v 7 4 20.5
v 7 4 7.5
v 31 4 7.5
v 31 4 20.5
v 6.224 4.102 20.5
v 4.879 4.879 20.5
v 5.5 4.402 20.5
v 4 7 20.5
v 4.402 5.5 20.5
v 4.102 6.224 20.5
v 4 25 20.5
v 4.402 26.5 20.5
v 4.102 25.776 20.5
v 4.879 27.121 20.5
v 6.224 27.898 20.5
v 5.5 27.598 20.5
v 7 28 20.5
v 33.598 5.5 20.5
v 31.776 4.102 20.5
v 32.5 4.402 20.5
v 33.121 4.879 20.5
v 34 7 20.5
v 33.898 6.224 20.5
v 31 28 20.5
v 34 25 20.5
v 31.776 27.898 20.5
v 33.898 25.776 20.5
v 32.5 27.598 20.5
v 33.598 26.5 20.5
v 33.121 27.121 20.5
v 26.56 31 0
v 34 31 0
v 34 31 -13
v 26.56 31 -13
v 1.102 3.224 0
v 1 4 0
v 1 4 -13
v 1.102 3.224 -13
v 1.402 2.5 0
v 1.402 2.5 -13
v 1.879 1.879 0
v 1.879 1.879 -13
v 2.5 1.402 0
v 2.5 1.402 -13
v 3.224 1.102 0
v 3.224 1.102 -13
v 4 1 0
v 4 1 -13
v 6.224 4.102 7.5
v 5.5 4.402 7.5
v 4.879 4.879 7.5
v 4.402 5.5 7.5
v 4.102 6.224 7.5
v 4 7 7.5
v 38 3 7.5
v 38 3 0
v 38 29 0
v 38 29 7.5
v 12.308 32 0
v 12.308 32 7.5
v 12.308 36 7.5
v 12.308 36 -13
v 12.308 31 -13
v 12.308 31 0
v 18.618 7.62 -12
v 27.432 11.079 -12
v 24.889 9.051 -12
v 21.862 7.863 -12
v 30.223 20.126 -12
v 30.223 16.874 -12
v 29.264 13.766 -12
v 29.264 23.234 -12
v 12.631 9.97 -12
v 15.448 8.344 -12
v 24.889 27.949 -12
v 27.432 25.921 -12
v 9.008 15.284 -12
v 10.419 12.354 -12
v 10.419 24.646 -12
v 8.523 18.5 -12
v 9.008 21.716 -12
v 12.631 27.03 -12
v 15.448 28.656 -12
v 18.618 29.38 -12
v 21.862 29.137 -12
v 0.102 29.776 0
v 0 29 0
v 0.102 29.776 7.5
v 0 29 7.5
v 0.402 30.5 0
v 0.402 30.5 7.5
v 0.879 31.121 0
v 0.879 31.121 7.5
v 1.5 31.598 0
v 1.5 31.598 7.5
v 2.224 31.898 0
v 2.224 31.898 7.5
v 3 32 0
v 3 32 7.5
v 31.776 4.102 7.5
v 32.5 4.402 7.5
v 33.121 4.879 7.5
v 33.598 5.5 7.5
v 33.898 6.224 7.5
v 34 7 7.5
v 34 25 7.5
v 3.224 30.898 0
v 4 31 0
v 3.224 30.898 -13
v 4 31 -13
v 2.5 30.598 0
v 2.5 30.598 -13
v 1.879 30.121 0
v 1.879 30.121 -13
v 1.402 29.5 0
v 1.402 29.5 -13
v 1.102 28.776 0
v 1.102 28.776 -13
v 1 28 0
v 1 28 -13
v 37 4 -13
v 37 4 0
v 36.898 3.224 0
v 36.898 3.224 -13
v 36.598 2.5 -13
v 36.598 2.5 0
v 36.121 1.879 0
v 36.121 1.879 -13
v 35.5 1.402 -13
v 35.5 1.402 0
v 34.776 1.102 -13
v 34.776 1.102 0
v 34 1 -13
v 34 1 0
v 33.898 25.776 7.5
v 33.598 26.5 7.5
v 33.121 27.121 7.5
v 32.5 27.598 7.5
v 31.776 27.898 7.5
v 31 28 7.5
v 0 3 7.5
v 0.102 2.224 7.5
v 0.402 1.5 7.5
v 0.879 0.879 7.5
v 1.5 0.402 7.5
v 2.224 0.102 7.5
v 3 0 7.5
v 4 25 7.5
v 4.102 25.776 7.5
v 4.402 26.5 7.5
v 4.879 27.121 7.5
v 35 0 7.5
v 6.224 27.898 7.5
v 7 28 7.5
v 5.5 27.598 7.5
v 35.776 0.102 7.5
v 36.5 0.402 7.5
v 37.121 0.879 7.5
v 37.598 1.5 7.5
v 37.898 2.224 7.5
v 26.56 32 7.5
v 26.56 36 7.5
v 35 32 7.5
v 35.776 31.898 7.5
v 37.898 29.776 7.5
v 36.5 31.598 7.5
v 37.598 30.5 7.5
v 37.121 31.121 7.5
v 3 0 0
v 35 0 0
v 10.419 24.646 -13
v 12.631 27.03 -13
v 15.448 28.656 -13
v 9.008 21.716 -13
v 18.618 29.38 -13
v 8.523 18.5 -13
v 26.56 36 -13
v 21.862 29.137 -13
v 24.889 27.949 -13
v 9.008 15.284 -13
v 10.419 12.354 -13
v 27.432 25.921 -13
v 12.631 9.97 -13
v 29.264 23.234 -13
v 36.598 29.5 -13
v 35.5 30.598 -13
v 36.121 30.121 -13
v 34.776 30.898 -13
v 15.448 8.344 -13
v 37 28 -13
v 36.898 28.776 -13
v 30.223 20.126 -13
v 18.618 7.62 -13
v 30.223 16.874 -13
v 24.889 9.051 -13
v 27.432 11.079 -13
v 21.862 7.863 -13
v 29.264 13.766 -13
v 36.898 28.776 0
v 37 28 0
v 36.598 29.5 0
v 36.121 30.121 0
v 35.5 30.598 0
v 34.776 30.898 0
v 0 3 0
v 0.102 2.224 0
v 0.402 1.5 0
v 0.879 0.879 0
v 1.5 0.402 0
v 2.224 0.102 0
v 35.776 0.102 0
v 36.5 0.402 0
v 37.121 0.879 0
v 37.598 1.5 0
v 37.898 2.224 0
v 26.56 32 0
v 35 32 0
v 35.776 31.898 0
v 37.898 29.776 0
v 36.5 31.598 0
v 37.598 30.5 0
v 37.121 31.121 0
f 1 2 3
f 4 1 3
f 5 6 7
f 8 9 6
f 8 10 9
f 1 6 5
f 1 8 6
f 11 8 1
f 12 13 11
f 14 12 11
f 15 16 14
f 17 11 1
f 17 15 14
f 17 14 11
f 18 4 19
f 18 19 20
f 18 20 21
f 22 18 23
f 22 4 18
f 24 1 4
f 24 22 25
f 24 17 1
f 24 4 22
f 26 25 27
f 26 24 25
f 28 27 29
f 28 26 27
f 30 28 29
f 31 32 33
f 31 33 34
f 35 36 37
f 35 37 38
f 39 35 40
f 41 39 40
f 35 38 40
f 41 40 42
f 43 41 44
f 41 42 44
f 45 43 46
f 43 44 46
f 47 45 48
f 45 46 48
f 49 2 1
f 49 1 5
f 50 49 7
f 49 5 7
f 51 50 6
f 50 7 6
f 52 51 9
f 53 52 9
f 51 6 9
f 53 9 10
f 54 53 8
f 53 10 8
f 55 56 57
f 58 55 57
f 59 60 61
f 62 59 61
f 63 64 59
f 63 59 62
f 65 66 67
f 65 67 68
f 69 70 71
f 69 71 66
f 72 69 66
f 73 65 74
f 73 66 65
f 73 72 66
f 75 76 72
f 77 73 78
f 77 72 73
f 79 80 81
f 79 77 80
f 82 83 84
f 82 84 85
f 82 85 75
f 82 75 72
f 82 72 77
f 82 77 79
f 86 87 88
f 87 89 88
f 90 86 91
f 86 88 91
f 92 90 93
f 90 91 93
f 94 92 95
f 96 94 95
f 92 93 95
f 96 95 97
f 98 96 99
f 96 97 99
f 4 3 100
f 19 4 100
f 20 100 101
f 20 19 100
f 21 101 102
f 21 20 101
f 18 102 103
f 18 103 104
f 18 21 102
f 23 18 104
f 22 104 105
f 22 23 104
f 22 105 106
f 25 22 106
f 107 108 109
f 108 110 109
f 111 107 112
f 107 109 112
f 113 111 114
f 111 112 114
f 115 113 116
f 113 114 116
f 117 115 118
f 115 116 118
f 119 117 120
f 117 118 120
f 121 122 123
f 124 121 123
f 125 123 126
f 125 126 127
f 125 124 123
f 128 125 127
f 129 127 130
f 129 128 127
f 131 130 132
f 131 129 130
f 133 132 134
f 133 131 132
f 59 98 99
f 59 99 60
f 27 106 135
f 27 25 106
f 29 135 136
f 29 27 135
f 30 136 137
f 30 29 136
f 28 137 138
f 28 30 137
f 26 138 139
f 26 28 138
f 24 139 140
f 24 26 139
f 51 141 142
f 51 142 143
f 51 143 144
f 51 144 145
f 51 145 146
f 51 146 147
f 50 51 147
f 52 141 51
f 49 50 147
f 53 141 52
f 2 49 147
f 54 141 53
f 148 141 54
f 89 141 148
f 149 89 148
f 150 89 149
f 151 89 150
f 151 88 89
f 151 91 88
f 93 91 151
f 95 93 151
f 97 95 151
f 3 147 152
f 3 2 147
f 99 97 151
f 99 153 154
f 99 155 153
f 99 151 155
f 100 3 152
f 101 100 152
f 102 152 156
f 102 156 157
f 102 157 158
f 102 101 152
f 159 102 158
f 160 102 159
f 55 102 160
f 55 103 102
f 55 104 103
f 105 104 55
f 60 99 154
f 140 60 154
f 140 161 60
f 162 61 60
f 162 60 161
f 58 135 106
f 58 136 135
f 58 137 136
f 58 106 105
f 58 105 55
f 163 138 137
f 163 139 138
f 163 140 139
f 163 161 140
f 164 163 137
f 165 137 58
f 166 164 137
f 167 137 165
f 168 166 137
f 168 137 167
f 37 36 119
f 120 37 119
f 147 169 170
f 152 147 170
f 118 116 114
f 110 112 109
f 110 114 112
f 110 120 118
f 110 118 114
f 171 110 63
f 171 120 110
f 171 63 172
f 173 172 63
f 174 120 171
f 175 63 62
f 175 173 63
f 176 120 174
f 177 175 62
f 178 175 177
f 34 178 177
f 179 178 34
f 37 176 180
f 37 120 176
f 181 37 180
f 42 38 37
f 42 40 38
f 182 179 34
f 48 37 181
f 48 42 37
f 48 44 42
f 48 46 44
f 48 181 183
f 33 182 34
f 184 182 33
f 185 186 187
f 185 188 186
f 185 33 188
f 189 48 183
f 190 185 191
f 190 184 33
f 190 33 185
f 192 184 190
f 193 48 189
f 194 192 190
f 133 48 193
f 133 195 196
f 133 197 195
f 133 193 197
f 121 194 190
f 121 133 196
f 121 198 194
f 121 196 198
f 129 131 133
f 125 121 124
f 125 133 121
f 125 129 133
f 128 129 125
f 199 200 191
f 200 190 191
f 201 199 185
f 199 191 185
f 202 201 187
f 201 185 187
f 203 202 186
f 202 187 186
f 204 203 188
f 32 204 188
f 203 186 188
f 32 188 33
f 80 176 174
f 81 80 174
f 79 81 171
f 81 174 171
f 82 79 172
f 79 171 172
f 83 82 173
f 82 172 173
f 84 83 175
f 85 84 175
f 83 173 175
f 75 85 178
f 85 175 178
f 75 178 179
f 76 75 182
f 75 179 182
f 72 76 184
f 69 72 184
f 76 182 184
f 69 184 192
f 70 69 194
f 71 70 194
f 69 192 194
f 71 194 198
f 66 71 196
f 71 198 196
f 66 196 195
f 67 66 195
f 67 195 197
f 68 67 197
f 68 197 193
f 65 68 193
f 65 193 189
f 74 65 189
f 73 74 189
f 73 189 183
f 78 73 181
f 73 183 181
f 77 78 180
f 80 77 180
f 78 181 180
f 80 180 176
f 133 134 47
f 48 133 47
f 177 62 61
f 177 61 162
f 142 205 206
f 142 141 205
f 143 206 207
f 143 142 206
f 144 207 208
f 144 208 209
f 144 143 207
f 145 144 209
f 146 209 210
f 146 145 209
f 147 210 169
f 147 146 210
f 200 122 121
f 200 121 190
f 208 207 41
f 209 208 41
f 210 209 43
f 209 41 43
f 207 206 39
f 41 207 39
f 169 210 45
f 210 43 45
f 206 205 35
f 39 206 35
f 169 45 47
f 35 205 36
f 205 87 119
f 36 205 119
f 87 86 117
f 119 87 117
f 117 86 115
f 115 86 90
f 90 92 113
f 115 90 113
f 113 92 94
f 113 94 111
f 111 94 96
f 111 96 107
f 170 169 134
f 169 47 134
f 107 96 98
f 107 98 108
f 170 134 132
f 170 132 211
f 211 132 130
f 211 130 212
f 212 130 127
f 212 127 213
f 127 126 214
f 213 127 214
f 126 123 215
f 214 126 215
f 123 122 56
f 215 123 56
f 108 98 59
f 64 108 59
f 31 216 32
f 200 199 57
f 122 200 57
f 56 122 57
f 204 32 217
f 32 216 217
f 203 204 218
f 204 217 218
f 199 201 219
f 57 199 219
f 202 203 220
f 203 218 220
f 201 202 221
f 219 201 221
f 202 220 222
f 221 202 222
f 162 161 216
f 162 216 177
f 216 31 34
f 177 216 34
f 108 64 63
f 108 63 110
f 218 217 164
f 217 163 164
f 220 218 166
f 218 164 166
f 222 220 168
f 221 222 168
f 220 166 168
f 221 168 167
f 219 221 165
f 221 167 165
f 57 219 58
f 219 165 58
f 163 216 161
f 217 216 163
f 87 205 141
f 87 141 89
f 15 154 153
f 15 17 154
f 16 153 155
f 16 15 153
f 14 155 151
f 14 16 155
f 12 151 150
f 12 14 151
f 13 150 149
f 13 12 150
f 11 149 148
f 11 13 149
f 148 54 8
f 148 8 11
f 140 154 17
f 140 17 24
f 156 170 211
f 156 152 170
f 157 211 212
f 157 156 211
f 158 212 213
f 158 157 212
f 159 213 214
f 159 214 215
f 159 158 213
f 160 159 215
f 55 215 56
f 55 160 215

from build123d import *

# Parameters (mm, degrees)
SKETCH_1_W          = 38
SKETCH_1_H          = 32
EXTRUDE_1_DEPTH     = 7.5
SKETCH_2_W          = 30
SKETCH_2_H          = 24
EXTRUDE_2_DEPTH     = 13
SKETCH_3_W          = 36
SKETCH_3_H          = 30
EXTRUDE_3_DEPTH     = 13
FILLET_1_R          = 3
SKETCH_4_W          = 14.251967781
SKETCH_4_H          = 20.5
EXTRUDE_4_DEPTH     = 5
SKETCH_5_R          = 10.910611056
CUT_EXTRUDE_1_DEPTH = 1


with BuildPart() as part:
    # ｽｹｯﾁ1 → ﾎﾞｽ - 押し出し1 (new body)
    with BuildSketch(Plane.XY):
        with Locations((19, 16)):
            Rectangle(SKETCH_1_W, SKETCH_1_H)
    extrude(amount=EXTRUDE_1_DEPTH)

    # ｽｹｯﾁ2 → ﾎﾞｽ - 押し出し2 (add)
    with BuildSketch(Plane.XY.offset(7.5)):
        with Locations((19, 16)):
            Rectangle(SKETCH_2_W, SKETCH_2_H)
    extrude(amount=EXTRUDE_2_DEPTH)

    # ｽｹｯﾁ3 → ﾎﾞｽ - 押し出し3 (add)
    with BuildSketch(Plane(origin=(0, 0, 0), x_dir=(-1, 0, 0), z_dir=(0, 0, -1))):
        with Locations((-19, 16)):
            Rectangle(SKETCH_3_W, SKETCH_3_H)
    extrude(amount=EXTRUDE_3_DEPTH)

    # ﾌｨﾚｯﾄ1
    fillet_1_edges = [part.edges().sort_by_distance(p)[0] for p in [
        (34, 28, 14),
        (4, 28, 14),
        (4, 4, 14),
        (34, 4, 14),
        (37, 1, -6.5),
        (1, 1, -6.5),
        (1, 31, -6.5),
        (37, 31, -6.5),
        (0, 32, 3.75),
        (38, 32, 3.75),
        (38, 0, 3.75),
        (0, 0, 3.75),
    ]]
    fillet(fillet_1_edges, radius=FILLET_1_R)

    # ｽｹｯﾁ4 → ﾎﾞｽ - 押し出し4 (add)
    with BuildSketch(Plane(origin=(0, 31, 0), x_dir=(1, 0, 0), z_dir=(0, 1, 0))):
        with Locations((19.433755542, 2.75)):
            Rectangle(SKETCH_4_W, SKETCH_4_H)
    extrude(amount=EXTRUDE_4_DEPTH)

    # ｽｹｯﾁ5 → ｶｯﾄ - 押し出し1 (cut)
    with BuildSketch(Plane(origin=(0, 0, -13), x_dir=(-1, 0, 0), z_dir=(0, 0, -1))):
        with Locations((-19.433755541, 18.5)):
            Circle(SKETCH_5_R)
    extrude(amount=-CUT_EXTRUDE_1_DEPTH, mode=Mode.SUBTRACT)


solid = part.part
